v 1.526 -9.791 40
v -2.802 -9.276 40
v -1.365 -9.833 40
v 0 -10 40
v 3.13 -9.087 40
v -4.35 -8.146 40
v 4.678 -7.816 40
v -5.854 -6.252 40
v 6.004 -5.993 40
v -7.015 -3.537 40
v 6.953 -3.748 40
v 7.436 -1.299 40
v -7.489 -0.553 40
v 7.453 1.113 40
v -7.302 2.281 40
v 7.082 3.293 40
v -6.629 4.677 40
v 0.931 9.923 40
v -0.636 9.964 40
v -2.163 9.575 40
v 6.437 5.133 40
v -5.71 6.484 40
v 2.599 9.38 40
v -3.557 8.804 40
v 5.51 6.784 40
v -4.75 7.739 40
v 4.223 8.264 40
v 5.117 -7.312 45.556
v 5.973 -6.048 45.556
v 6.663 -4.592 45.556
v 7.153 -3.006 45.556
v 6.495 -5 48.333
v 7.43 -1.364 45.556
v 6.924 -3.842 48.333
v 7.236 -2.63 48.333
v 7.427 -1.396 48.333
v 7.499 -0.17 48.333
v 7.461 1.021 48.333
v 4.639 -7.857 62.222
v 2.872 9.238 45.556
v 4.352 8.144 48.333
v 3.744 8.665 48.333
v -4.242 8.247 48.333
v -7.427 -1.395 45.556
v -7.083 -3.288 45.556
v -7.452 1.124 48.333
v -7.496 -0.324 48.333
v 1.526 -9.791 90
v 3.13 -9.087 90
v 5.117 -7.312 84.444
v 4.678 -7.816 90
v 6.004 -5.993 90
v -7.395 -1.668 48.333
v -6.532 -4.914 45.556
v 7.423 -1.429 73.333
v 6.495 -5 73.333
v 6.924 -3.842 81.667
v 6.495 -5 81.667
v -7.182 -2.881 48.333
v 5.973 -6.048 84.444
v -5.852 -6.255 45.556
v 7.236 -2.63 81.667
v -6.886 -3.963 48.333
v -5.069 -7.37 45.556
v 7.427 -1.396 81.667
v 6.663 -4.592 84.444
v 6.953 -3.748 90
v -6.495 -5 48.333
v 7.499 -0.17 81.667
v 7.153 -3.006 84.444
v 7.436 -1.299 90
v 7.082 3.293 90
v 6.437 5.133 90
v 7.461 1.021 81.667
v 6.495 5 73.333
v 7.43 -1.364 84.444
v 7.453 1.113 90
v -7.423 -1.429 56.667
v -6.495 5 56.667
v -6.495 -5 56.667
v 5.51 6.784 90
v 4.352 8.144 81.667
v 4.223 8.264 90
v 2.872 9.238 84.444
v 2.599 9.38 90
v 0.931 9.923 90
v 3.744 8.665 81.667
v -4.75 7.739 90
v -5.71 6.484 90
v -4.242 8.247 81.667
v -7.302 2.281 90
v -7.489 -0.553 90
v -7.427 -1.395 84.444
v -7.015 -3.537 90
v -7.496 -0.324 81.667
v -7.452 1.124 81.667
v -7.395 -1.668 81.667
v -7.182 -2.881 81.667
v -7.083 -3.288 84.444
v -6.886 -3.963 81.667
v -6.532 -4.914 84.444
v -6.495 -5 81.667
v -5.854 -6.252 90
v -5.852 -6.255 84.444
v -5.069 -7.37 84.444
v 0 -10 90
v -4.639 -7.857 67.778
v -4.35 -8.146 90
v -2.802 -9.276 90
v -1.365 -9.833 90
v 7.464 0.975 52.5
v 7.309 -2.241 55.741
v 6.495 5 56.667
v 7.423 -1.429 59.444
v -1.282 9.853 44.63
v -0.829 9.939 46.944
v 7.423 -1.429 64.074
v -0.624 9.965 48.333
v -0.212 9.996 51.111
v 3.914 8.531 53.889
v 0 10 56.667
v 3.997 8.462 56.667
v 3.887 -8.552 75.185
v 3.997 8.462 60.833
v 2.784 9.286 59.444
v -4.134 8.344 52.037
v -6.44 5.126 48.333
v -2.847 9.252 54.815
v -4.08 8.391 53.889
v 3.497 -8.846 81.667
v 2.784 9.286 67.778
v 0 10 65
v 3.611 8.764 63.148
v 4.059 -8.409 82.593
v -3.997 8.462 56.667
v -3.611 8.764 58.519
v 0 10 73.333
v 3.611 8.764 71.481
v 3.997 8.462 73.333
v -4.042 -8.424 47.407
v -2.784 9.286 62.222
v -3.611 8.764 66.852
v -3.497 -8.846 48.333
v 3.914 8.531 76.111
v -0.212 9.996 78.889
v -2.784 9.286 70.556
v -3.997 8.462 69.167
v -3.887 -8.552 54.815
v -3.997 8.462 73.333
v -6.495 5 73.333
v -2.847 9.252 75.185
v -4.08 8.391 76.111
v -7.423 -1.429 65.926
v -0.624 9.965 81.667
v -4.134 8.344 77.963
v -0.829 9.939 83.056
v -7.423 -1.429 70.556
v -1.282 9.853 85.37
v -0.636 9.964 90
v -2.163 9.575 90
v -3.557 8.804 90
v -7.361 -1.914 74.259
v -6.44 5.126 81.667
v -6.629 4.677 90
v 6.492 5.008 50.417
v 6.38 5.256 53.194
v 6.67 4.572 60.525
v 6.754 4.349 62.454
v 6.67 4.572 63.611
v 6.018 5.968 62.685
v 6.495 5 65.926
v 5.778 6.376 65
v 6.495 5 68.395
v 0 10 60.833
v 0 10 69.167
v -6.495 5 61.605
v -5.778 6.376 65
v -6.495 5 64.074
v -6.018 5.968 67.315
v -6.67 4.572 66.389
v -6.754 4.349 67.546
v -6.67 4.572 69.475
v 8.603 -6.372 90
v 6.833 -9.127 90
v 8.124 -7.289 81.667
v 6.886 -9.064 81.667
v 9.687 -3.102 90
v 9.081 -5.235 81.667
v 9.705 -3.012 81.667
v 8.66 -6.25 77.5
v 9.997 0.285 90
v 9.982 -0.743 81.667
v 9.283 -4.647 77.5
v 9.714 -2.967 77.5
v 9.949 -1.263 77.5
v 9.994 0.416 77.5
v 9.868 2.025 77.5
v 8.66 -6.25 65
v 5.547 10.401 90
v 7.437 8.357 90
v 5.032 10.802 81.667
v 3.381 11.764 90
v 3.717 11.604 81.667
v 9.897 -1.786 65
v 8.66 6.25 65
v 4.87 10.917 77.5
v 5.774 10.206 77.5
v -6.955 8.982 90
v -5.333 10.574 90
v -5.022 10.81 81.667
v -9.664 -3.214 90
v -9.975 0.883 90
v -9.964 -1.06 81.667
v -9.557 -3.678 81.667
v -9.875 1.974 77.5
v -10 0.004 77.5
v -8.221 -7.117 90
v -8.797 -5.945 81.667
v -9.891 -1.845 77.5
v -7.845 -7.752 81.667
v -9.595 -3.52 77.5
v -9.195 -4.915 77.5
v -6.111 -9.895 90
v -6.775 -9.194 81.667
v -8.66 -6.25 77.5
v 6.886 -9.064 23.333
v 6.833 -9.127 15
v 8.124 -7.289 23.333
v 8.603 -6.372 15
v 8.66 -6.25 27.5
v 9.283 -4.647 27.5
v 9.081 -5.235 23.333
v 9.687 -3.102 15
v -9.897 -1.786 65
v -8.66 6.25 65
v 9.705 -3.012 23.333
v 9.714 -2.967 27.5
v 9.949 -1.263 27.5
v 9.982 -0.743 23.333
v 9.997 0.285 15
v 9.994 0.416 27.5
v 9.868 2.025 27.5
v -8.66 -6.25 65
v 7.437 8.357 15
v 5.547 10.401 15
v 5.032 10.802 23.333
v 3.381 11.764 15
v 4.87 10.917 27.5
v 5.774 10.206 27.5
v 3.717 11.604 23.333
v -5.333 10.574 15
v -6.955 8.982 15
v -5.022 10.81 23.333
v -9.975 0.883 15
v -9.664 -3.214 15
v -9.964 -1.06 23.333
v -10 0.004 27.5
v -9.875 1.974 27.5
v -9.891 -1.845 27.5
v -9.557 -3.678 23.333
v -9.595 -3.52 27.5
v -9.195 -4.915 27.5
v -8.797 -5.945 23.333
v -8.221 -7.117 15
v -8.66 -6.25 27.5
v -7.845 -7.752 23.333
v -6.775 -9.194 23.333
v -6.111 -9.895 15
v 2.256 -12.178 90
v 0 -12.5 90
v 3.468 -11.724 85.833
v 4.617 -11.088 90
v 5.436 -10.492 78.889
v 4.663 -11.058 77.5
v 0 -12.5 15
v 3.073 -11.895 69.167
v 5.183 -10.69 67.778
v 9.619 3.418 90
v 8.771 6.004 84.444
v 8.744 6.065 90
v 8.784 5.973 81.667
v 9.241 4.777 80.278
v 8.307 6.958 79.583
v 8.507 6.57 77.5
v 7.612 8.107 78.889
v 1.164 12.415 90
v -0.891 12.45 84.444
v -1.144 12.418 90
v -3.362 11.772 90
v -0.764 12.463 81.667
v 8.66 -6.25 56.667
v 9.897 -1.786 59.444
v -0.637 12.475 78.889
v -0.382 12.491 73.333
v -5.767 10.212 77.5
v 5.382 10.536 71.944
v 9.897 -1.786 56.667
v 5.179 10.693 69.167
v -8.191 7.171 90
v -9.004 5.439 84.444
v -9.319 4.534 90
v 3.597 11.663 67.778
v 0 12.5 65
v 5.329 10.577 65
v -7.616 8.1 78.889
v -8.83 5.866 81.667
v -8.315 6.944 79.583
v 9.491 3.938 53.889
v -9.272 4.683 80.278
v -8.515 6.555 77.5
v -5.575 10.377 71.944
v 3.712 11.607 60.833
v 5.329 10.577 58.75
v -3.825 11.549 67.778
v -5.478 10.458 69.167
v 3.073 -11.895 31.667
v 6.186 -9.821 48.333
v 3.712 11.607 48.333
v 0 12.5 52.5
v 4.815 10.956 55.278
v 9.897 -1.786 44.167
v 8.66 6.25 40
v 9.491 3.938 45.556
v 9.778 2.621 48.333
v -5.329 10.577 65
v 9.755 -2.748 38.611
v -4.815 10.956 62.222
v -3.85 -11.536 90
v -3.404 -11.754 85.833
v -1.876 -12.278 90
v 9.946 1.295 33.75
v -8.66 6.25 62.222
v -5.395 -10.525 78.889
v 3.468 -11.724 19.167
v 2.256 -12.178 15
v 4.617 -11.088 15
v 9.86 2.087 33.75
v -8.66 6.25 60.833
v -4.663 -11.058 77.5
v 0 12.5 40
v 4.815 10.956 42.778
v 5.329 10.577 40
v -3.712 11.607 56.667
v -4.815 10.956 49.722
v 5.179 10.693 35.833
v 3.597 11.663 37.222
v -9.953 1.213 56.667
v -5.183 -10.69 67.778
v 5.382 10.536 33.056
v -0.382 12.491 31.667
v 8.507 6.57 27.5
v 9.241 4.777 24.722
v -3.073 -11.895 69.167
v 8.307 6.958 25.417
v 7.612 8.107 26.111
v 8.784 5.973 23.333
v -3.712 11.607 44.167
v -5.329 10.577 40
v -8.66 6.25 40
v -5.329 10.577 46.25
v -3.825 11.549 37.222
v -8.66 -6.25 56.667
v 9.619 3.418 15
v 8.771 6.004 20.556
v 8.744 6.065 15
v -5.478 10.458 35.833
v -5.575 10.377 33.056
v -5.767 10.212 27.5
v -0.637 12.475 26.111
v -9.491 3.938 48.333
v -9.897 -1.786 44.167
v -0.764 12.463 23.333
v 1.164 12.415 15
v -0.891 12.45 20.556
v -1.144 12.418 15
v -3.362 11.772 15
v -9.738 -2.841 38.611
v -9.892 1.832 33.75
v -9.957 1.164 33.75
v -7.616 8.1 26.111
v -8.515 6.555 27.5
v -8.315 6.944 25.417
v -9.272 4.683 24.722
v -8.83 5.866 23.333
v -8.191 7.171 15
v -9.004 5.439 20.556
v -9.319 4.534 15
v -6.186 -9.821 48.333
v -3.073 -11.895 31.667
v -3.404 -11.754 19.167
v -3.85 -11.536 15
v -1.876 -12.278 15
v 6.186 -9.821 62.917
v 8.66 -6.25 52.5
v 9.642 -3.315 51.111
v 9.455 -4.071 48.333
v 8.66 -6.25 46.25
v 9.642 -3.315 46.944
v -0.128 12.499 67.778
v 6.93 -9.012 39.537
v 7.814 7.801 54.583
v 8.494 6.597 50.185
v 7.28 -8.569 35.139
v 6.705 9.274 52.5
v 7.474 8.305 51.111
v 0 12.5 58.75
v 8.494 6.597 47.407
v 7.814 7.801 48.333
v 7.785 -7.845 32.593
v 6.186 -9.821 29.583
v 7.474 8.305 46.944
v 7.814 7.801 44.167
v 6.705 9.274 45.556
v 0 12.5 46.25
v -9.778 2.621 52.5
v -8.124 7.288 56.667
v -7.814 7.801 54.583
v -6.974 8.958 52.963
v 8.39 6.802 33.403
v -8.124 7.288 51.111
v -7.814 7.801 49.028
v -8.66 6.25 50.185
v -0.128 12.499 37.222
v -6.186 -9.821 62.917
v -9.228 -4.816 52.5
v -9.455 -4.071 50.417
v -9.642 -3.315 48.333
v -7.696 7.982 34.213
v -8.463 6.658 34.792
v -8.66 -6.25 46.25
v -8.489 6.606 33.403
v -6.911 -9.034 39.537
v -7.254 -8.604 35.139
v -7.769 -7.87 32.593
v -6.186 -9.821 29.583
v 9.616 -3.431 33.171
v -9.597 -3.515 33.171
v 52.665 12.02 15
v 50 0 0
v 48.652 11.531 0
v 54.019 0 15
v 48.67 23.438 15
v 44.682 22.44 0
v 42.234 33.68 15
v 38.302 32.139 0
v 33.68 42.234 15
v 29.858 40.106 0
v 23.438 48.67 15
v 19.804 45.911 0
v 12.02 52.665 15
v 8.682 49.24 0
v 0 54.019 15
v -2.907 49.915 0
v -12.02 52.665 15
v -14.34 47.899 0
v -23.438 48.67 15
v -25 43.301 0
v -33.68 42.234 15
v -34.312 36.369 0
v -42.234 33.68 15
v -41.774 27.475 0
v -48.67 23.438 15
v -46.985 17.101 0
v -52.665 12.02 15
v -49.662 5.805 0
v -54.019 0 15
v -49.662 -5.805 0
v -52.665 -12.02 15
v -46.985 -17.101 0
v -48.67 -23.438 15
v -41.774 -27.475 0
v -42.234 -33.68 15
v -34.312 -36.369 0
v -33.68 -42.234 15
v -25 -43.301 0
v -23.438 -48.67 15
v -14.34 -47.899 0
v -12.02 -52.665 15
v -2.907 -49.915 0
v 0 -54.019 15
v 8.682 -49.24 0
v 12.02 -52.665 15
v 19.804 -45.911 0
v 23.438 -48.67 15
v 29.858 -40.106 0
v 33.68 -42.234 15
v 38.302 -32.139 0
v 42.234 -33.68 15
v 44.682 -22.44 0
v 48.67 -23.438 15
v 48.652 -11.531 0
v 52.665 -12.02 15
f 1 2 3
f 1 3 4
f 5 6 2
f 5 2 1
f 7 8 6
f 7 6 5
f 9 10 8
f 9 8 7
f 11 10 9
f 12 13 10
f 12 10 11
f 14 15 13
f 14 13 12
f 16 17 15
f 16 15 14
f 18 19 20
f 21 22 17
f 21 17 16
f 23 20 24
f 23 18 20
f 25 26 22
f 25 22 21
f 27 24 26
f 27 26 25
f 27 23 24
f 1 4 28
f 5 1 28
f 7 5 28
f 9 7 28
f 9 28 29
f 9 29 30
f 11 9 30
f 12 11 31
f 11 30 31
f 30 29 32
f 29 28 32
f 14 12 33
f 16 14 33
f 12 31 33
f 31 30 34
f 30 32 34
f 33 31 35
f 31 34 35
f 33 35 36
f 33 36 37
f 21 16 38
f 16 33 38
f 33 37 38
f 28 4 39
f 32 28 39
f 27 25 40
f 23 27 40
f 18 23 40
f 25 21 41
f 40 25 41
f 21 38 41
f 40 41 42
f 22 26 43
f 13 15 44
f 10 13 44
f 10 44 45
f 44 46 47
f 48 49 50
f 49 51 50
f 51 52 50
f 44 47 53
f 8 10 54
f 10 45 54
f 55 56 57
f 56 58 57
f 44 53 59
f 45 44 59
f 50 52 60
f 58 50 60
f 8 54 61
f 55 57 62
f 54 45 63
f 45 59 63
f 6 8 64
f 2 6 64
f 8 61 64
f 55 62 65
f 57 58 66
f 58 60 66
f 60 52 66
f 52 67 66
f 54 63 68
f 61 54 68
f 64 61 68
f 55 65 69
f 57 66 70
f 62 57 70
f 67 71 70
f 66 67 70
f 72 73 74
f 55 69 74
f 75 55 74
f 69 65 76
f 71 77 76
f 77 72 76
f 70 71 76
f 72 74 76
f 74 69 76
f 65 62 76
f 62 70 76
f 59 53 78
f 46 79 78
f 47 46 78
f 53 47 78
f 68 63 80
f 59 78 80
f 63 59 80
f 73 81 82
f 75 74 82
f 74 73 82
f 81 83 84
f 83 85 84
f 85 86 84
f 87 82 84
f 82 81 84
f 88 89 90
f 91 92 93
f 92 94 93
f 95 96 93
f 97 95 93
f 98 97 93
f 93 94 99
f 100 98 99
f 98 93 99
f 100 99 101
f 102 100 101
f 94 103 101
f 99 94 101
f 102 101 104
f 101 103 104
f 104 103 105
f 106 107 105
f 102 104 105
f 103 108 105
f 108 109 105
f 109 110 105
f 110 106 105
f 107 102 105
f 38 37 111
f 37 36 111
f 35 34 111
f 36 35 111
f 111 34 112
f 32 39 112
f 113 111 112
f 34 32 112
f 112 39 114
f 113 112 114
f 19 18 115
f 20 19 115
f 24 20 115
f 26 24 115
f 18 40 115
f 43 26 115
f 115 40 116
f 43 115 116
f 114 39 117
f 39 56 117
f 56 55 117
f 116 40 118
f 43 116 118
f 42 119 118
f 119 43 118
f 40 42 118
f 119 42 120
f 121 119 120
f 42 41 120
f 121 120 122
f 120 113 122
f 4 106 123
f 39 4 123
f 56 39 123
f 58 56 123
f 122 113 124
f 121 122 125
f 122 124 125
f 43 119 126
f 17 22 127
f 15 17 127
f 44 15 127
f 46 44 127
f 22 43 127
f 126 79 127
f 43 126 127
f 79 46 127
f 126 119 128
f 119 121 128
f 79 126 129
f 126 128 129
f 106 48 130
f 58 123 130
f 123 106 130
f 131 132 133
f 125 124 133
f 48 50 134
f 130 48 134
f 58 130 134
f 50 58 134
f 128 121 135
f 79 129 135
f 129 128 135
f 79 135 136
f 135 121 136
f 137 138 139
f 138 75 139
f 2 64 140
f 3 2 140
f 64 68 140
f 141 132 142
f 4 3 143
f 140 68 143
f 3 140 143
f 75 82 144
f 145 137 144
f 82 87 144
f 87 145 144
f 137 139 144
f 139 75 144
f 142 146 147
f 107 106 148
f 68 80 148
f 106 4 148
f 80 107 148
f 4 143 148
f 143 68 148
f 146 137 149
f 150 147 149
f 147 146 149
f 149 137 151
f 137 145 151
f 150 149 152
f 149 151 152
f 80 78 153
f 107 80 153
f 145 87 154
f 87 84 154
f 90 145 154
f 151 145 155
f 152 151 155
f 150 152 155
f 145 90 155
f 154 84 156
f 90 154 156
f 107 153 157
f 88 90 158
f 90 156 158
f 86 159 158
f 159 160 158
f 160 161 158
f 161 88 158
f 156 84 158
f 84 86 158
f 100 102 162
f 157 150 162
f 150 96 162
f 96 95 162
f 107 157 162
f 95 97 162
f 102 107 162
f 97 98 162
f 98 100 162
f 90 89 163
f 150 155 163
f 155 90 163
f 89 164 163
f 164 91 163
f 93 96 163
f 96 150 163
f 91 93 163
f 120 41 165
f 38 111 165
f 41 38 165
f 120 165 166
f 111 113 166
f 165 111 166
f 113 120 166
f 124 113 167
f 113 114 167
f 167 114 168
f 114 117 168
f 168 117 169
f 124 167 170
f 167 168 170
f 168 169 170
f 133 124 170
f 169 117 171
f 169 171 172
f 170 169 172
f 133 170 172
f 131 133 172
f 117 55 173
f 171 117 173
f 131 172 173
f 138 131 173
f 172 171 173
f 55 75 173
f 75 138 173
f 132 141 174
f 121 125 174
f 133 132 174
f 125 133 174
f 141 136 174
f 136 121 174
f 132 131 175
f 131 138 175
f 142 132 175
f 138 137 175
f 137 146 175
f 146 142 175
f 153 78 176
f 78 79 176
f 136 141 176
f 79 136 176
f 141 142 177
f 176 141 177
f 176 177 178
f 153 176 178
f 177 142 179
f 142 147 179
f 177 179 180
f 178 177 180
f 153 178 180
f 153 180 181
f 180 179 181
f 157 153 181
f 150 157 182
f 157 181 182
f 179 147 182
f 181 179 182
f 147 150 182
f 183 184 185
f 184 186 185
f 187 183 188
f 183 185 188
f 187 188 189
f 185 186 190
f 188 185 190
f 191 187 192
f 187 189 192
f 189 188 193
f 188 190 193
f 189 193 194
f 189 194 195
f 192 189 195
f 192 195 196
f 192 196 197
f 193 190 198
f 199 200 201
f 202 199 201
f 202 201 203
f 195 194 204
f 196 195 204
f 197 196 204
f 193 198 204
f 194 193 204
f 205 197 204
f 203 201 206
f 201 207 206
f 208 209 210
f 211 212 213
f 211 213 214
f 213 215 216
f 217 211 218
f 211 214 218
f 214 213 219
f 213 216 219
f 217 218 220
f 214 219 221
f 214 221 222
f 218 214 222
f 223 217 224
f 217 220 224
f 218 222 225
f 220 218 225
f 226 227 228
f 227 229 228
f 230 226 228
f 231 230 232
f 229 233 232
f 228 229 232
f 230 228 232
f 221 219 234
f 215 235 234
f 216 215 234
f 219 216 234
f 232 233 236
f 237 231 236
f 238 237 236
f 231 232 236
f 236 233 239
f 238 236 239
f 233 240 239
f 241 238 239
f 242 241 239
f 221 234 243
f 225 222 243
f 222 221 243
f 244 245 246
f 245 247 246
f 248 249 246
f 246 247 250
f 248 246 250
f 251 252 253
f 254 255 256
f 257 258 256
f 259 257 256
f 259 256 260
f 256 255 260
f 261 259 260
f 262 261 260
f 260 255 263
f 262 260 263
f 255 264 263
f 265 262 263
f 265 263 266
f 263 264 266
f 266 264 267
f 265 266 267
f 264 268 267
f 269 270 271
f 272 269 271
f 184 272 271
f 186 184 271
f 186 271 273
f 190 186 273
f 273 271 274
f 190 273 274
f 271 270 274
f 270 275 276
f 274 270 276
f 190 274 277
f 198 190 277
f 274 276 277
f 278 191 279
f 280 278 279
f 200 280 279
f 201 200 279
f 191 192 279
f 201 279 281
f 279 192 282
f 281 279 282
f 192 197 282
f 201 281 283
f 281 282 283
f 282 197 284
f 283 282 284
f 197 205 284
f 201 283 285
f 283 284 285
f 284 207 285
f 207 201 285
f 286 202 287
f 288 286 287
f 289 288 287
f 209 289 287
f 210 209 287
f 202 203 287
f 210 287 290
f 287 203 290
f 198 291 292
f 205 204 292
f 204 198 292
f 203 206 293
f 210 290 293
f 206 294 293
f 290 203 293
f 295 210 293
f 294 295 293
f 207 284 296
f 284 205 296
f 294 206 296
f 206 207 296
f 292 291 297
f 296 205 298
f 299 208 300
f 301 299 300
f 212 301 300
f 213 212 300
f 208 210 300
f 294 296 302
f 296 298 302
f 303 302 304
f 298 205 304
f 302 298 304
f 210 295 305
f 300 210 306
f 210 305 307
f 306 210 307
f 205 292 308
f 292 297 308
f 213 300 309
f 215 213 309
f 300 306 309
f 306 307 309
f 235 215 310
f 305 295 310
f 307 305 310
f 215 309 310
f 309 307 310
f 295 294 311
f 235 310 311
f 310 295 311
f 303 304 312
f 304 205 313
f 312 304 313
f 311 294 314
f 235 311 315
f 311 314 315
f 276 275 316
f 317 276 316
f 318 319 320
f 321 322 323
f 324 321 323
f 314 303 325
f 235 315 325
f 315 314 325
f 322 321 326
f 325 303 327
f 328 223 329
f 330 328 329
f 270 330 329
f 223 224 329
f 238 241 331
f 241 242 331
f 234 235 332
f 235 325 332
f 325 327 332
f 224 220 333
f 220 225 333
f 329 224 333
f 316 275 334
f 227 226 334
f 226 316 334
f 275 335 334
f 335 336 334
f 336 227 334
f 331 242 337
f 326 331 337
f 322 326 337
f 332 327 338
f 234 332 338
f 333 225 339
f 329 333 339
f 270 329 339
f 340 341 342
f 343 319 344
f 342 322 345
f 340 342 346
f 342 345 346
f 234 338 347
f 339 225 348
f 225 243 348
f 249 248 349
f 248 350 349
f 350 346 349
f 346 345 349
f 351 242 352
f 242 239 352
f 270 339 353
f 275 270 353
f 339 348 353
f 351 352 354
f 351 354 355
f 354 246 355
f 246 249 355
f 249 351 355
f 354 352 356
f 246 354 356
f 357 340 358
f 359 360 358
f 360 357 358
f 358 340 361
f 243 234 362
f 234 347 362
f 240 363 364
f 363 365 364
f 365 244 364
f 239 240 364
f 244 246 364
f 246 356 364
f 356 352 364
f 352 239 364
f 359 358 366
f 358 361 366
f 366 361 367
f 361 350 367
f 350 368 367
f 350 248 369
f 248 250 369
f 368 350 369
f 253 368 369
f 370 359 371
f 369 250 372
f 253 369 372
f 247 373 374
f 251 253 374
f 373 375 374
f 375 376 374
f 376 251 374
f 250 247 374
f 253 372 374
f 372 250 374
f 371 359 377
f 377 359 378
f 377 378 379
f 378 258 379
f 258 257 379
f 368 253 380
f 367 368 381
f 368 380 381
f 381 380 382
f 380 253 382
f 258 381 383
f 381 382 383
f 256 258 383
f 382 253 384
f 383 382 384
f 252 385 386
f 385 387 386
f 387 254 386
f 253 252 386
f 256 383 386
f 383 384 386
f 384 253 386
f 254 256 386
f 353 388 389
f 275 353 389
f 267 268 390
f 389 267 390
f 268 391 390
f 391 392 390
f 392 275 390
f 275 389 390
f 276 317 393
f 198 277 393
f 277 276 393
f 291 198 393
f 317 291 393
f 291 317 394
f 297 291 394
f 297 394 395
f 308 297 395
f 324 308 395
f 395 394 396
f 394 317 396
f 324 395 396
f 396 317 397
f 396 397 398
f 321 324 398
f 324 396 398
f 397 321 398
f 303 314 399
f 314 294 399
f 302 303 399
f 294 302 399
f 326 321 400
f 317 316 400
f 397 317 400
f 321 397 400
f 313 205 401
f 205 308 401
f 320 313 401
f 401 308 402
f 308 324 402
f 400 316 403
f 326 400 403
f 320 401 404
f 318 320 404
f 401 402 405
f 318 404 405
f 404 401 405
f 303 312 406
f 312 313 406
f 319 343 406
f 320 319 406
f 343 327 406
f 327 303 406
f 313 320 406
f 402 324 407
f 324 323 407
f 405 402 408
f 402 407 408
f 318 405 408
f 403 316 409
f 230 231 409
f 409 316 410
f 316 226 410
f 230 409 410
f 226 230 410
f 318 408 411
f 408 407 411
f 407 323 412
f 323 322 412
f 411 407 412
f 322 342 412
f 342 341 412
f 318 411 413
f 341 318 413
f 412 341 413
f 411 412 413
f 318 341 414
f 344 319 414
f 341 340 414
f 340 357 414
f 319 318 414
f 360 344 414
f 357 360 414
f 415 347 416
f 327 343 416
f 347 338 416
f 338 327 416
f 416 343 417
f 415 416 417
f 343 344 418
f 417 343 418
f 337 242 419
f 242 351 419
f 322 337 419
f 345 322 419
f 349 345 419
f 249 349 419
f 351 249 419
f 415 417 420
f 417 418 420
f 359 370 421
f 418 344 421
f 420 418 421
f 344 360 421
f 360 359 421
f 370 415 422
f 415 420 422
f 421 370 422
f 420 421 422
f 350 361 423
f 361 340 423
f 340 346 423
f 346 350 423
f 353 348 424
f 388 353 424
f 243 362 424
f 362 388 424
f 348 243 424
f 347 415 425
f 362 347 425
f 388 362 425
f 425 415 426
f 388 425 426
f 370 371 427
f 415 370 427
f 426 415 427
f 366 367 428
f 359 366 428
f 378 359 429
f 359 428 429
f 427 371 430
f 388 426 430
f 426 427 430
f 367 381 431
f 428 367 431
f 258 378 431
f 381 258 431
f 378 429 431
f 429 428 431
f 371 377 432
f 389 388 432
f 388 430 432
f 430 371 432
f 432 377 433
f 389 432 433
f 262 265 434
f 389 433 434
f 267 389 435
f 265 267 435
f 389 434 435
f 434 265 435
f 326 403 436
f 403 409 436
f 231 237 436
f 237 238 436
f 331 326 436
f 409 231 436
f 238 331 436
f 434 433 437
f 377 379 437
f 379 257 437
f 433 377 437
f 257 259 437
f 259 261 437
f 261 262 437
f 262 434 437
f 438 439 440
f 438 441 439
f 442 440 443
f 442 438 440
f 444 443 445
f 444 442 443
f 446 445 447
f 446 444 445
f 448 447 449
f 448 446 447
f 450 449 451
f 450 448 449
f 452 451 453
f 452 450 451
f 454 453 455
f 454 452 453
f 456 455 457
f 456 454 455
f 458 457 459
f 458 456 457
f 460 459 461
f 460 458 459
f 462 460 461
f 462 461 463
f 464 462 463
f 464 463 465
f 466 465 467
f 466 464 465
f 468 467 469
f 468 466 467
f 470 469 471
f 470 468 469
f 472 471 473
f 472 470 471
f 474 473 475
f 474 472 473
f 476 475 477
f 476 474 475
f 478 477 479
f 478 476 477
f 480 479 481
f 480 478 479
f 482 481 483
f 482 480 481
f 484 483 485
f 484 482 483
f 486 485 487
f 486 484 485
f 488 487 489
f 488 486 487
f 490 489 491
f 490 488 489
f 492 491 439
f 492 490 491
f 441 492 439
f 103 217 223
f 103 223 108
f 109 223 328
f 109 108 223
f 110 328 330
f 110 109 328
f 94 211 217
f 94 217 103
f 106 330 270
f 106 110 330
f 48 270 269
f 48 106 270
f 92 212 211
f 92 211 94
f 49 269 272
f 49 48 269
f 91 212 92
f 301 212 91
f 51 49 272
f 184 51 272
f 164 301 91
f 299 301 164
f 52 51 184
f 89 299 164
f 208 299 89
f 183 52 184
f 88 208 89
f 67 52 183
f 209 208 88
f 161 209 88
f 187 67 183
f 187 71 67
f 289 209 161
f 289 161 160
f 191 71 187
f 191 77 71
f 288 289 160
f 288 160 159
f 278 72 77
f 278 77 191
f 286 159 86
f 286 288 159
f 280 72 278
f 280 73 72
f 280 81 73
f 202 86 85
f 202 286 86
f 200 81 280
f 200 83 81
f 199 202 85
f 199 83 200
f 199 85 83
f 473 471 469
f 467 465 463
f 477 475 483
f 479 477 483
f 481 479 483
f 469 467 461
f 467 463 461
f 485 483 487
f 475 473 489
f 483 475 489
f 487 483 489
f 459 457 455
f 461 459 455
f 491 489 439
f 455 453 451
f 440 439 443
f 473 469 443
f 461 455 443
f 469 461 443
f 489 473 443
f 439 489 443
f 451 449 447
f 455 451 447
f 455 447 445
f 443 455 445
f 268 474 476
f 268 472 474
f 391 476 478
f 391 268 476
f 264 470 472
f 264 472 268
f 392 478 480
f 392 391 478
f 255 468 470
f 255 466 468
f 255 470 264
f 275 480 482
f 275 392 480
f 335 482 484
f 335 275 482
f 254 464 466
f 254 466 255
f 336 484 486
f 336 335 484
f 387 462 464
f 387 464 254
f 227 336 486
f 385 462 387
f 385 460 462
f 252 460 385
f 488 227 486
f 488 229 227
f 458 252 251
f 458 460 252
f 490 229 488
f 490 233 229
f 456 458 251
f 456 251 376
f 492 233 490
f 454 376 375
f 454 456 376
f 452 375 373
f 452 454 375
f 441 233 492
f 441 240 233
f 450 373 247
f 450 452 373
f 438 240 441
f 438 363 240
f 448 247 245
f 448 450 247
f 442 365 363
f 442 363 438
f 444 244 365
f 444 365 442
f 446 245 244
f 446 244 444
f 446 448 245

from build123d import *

# Parameters (mm, degrees)
F0_R     = 50
F1_DEPTH = 15
F1_TAPER = -15
F3_DEPTH = 75
F5_DEPTH = 50


with BuildPart() as f1:
    # F0 (on Top) → F1 (new body)
    with BuildSketch(Plane.XY):
        Circle(F0_R)
    extrude(amount=F1_DEPTH, taper=F1_TAPER)

    # F2 (on face) → F3 (join)
    with BuildSketch(Plane.XY.offset(15)):
        with BuildLine():
            add(Edge.make_bspline(
                [(0, -12.5), (17.3205080757, -12.5), (8.6602540378, 6.25), (0, 25), (-8.6602540378, 6.25), (-17.3205080757, -12.5), (0, -12.5)],
                knots=[0, 0, 0, 2.0943951024, 2.0943951024, 4.1887902048, 4.1887902048, 6.2831853072, 6.2831853072, 6.2831853072], degree=2, weights=[1, 0.5, 1, 0.5, 1, 0.5, 1]))
        make_face()
    extrude(amount=F3_DEPTH)

    # F4 (on face) → F5 (cut)
    with BuildSketch(Plane.XY.offset(90)):
        with BuildLine():
            add(Edge.make_bspline(
                [(0, -10), (12.9903810568, -10), (6.4951905284, 5), (0, 20), (-6.4951905284, 5), (-12.9903810568, -10), (0, -10)],
                knots=[0, 0, 0, 2.0943951024, 2.0943951024, 4.1887902048, 4.1887902048, 6.2831853072, 6.2831853072, 6.2831853072], degree=2, weights=[1, 0.5, 1, 0.5, 1, 0.5, 1]))
        make_face()
    extrude(amount=-F5_DEPTH, mode=Mode.SUBTRACT)


solid = f1.part
